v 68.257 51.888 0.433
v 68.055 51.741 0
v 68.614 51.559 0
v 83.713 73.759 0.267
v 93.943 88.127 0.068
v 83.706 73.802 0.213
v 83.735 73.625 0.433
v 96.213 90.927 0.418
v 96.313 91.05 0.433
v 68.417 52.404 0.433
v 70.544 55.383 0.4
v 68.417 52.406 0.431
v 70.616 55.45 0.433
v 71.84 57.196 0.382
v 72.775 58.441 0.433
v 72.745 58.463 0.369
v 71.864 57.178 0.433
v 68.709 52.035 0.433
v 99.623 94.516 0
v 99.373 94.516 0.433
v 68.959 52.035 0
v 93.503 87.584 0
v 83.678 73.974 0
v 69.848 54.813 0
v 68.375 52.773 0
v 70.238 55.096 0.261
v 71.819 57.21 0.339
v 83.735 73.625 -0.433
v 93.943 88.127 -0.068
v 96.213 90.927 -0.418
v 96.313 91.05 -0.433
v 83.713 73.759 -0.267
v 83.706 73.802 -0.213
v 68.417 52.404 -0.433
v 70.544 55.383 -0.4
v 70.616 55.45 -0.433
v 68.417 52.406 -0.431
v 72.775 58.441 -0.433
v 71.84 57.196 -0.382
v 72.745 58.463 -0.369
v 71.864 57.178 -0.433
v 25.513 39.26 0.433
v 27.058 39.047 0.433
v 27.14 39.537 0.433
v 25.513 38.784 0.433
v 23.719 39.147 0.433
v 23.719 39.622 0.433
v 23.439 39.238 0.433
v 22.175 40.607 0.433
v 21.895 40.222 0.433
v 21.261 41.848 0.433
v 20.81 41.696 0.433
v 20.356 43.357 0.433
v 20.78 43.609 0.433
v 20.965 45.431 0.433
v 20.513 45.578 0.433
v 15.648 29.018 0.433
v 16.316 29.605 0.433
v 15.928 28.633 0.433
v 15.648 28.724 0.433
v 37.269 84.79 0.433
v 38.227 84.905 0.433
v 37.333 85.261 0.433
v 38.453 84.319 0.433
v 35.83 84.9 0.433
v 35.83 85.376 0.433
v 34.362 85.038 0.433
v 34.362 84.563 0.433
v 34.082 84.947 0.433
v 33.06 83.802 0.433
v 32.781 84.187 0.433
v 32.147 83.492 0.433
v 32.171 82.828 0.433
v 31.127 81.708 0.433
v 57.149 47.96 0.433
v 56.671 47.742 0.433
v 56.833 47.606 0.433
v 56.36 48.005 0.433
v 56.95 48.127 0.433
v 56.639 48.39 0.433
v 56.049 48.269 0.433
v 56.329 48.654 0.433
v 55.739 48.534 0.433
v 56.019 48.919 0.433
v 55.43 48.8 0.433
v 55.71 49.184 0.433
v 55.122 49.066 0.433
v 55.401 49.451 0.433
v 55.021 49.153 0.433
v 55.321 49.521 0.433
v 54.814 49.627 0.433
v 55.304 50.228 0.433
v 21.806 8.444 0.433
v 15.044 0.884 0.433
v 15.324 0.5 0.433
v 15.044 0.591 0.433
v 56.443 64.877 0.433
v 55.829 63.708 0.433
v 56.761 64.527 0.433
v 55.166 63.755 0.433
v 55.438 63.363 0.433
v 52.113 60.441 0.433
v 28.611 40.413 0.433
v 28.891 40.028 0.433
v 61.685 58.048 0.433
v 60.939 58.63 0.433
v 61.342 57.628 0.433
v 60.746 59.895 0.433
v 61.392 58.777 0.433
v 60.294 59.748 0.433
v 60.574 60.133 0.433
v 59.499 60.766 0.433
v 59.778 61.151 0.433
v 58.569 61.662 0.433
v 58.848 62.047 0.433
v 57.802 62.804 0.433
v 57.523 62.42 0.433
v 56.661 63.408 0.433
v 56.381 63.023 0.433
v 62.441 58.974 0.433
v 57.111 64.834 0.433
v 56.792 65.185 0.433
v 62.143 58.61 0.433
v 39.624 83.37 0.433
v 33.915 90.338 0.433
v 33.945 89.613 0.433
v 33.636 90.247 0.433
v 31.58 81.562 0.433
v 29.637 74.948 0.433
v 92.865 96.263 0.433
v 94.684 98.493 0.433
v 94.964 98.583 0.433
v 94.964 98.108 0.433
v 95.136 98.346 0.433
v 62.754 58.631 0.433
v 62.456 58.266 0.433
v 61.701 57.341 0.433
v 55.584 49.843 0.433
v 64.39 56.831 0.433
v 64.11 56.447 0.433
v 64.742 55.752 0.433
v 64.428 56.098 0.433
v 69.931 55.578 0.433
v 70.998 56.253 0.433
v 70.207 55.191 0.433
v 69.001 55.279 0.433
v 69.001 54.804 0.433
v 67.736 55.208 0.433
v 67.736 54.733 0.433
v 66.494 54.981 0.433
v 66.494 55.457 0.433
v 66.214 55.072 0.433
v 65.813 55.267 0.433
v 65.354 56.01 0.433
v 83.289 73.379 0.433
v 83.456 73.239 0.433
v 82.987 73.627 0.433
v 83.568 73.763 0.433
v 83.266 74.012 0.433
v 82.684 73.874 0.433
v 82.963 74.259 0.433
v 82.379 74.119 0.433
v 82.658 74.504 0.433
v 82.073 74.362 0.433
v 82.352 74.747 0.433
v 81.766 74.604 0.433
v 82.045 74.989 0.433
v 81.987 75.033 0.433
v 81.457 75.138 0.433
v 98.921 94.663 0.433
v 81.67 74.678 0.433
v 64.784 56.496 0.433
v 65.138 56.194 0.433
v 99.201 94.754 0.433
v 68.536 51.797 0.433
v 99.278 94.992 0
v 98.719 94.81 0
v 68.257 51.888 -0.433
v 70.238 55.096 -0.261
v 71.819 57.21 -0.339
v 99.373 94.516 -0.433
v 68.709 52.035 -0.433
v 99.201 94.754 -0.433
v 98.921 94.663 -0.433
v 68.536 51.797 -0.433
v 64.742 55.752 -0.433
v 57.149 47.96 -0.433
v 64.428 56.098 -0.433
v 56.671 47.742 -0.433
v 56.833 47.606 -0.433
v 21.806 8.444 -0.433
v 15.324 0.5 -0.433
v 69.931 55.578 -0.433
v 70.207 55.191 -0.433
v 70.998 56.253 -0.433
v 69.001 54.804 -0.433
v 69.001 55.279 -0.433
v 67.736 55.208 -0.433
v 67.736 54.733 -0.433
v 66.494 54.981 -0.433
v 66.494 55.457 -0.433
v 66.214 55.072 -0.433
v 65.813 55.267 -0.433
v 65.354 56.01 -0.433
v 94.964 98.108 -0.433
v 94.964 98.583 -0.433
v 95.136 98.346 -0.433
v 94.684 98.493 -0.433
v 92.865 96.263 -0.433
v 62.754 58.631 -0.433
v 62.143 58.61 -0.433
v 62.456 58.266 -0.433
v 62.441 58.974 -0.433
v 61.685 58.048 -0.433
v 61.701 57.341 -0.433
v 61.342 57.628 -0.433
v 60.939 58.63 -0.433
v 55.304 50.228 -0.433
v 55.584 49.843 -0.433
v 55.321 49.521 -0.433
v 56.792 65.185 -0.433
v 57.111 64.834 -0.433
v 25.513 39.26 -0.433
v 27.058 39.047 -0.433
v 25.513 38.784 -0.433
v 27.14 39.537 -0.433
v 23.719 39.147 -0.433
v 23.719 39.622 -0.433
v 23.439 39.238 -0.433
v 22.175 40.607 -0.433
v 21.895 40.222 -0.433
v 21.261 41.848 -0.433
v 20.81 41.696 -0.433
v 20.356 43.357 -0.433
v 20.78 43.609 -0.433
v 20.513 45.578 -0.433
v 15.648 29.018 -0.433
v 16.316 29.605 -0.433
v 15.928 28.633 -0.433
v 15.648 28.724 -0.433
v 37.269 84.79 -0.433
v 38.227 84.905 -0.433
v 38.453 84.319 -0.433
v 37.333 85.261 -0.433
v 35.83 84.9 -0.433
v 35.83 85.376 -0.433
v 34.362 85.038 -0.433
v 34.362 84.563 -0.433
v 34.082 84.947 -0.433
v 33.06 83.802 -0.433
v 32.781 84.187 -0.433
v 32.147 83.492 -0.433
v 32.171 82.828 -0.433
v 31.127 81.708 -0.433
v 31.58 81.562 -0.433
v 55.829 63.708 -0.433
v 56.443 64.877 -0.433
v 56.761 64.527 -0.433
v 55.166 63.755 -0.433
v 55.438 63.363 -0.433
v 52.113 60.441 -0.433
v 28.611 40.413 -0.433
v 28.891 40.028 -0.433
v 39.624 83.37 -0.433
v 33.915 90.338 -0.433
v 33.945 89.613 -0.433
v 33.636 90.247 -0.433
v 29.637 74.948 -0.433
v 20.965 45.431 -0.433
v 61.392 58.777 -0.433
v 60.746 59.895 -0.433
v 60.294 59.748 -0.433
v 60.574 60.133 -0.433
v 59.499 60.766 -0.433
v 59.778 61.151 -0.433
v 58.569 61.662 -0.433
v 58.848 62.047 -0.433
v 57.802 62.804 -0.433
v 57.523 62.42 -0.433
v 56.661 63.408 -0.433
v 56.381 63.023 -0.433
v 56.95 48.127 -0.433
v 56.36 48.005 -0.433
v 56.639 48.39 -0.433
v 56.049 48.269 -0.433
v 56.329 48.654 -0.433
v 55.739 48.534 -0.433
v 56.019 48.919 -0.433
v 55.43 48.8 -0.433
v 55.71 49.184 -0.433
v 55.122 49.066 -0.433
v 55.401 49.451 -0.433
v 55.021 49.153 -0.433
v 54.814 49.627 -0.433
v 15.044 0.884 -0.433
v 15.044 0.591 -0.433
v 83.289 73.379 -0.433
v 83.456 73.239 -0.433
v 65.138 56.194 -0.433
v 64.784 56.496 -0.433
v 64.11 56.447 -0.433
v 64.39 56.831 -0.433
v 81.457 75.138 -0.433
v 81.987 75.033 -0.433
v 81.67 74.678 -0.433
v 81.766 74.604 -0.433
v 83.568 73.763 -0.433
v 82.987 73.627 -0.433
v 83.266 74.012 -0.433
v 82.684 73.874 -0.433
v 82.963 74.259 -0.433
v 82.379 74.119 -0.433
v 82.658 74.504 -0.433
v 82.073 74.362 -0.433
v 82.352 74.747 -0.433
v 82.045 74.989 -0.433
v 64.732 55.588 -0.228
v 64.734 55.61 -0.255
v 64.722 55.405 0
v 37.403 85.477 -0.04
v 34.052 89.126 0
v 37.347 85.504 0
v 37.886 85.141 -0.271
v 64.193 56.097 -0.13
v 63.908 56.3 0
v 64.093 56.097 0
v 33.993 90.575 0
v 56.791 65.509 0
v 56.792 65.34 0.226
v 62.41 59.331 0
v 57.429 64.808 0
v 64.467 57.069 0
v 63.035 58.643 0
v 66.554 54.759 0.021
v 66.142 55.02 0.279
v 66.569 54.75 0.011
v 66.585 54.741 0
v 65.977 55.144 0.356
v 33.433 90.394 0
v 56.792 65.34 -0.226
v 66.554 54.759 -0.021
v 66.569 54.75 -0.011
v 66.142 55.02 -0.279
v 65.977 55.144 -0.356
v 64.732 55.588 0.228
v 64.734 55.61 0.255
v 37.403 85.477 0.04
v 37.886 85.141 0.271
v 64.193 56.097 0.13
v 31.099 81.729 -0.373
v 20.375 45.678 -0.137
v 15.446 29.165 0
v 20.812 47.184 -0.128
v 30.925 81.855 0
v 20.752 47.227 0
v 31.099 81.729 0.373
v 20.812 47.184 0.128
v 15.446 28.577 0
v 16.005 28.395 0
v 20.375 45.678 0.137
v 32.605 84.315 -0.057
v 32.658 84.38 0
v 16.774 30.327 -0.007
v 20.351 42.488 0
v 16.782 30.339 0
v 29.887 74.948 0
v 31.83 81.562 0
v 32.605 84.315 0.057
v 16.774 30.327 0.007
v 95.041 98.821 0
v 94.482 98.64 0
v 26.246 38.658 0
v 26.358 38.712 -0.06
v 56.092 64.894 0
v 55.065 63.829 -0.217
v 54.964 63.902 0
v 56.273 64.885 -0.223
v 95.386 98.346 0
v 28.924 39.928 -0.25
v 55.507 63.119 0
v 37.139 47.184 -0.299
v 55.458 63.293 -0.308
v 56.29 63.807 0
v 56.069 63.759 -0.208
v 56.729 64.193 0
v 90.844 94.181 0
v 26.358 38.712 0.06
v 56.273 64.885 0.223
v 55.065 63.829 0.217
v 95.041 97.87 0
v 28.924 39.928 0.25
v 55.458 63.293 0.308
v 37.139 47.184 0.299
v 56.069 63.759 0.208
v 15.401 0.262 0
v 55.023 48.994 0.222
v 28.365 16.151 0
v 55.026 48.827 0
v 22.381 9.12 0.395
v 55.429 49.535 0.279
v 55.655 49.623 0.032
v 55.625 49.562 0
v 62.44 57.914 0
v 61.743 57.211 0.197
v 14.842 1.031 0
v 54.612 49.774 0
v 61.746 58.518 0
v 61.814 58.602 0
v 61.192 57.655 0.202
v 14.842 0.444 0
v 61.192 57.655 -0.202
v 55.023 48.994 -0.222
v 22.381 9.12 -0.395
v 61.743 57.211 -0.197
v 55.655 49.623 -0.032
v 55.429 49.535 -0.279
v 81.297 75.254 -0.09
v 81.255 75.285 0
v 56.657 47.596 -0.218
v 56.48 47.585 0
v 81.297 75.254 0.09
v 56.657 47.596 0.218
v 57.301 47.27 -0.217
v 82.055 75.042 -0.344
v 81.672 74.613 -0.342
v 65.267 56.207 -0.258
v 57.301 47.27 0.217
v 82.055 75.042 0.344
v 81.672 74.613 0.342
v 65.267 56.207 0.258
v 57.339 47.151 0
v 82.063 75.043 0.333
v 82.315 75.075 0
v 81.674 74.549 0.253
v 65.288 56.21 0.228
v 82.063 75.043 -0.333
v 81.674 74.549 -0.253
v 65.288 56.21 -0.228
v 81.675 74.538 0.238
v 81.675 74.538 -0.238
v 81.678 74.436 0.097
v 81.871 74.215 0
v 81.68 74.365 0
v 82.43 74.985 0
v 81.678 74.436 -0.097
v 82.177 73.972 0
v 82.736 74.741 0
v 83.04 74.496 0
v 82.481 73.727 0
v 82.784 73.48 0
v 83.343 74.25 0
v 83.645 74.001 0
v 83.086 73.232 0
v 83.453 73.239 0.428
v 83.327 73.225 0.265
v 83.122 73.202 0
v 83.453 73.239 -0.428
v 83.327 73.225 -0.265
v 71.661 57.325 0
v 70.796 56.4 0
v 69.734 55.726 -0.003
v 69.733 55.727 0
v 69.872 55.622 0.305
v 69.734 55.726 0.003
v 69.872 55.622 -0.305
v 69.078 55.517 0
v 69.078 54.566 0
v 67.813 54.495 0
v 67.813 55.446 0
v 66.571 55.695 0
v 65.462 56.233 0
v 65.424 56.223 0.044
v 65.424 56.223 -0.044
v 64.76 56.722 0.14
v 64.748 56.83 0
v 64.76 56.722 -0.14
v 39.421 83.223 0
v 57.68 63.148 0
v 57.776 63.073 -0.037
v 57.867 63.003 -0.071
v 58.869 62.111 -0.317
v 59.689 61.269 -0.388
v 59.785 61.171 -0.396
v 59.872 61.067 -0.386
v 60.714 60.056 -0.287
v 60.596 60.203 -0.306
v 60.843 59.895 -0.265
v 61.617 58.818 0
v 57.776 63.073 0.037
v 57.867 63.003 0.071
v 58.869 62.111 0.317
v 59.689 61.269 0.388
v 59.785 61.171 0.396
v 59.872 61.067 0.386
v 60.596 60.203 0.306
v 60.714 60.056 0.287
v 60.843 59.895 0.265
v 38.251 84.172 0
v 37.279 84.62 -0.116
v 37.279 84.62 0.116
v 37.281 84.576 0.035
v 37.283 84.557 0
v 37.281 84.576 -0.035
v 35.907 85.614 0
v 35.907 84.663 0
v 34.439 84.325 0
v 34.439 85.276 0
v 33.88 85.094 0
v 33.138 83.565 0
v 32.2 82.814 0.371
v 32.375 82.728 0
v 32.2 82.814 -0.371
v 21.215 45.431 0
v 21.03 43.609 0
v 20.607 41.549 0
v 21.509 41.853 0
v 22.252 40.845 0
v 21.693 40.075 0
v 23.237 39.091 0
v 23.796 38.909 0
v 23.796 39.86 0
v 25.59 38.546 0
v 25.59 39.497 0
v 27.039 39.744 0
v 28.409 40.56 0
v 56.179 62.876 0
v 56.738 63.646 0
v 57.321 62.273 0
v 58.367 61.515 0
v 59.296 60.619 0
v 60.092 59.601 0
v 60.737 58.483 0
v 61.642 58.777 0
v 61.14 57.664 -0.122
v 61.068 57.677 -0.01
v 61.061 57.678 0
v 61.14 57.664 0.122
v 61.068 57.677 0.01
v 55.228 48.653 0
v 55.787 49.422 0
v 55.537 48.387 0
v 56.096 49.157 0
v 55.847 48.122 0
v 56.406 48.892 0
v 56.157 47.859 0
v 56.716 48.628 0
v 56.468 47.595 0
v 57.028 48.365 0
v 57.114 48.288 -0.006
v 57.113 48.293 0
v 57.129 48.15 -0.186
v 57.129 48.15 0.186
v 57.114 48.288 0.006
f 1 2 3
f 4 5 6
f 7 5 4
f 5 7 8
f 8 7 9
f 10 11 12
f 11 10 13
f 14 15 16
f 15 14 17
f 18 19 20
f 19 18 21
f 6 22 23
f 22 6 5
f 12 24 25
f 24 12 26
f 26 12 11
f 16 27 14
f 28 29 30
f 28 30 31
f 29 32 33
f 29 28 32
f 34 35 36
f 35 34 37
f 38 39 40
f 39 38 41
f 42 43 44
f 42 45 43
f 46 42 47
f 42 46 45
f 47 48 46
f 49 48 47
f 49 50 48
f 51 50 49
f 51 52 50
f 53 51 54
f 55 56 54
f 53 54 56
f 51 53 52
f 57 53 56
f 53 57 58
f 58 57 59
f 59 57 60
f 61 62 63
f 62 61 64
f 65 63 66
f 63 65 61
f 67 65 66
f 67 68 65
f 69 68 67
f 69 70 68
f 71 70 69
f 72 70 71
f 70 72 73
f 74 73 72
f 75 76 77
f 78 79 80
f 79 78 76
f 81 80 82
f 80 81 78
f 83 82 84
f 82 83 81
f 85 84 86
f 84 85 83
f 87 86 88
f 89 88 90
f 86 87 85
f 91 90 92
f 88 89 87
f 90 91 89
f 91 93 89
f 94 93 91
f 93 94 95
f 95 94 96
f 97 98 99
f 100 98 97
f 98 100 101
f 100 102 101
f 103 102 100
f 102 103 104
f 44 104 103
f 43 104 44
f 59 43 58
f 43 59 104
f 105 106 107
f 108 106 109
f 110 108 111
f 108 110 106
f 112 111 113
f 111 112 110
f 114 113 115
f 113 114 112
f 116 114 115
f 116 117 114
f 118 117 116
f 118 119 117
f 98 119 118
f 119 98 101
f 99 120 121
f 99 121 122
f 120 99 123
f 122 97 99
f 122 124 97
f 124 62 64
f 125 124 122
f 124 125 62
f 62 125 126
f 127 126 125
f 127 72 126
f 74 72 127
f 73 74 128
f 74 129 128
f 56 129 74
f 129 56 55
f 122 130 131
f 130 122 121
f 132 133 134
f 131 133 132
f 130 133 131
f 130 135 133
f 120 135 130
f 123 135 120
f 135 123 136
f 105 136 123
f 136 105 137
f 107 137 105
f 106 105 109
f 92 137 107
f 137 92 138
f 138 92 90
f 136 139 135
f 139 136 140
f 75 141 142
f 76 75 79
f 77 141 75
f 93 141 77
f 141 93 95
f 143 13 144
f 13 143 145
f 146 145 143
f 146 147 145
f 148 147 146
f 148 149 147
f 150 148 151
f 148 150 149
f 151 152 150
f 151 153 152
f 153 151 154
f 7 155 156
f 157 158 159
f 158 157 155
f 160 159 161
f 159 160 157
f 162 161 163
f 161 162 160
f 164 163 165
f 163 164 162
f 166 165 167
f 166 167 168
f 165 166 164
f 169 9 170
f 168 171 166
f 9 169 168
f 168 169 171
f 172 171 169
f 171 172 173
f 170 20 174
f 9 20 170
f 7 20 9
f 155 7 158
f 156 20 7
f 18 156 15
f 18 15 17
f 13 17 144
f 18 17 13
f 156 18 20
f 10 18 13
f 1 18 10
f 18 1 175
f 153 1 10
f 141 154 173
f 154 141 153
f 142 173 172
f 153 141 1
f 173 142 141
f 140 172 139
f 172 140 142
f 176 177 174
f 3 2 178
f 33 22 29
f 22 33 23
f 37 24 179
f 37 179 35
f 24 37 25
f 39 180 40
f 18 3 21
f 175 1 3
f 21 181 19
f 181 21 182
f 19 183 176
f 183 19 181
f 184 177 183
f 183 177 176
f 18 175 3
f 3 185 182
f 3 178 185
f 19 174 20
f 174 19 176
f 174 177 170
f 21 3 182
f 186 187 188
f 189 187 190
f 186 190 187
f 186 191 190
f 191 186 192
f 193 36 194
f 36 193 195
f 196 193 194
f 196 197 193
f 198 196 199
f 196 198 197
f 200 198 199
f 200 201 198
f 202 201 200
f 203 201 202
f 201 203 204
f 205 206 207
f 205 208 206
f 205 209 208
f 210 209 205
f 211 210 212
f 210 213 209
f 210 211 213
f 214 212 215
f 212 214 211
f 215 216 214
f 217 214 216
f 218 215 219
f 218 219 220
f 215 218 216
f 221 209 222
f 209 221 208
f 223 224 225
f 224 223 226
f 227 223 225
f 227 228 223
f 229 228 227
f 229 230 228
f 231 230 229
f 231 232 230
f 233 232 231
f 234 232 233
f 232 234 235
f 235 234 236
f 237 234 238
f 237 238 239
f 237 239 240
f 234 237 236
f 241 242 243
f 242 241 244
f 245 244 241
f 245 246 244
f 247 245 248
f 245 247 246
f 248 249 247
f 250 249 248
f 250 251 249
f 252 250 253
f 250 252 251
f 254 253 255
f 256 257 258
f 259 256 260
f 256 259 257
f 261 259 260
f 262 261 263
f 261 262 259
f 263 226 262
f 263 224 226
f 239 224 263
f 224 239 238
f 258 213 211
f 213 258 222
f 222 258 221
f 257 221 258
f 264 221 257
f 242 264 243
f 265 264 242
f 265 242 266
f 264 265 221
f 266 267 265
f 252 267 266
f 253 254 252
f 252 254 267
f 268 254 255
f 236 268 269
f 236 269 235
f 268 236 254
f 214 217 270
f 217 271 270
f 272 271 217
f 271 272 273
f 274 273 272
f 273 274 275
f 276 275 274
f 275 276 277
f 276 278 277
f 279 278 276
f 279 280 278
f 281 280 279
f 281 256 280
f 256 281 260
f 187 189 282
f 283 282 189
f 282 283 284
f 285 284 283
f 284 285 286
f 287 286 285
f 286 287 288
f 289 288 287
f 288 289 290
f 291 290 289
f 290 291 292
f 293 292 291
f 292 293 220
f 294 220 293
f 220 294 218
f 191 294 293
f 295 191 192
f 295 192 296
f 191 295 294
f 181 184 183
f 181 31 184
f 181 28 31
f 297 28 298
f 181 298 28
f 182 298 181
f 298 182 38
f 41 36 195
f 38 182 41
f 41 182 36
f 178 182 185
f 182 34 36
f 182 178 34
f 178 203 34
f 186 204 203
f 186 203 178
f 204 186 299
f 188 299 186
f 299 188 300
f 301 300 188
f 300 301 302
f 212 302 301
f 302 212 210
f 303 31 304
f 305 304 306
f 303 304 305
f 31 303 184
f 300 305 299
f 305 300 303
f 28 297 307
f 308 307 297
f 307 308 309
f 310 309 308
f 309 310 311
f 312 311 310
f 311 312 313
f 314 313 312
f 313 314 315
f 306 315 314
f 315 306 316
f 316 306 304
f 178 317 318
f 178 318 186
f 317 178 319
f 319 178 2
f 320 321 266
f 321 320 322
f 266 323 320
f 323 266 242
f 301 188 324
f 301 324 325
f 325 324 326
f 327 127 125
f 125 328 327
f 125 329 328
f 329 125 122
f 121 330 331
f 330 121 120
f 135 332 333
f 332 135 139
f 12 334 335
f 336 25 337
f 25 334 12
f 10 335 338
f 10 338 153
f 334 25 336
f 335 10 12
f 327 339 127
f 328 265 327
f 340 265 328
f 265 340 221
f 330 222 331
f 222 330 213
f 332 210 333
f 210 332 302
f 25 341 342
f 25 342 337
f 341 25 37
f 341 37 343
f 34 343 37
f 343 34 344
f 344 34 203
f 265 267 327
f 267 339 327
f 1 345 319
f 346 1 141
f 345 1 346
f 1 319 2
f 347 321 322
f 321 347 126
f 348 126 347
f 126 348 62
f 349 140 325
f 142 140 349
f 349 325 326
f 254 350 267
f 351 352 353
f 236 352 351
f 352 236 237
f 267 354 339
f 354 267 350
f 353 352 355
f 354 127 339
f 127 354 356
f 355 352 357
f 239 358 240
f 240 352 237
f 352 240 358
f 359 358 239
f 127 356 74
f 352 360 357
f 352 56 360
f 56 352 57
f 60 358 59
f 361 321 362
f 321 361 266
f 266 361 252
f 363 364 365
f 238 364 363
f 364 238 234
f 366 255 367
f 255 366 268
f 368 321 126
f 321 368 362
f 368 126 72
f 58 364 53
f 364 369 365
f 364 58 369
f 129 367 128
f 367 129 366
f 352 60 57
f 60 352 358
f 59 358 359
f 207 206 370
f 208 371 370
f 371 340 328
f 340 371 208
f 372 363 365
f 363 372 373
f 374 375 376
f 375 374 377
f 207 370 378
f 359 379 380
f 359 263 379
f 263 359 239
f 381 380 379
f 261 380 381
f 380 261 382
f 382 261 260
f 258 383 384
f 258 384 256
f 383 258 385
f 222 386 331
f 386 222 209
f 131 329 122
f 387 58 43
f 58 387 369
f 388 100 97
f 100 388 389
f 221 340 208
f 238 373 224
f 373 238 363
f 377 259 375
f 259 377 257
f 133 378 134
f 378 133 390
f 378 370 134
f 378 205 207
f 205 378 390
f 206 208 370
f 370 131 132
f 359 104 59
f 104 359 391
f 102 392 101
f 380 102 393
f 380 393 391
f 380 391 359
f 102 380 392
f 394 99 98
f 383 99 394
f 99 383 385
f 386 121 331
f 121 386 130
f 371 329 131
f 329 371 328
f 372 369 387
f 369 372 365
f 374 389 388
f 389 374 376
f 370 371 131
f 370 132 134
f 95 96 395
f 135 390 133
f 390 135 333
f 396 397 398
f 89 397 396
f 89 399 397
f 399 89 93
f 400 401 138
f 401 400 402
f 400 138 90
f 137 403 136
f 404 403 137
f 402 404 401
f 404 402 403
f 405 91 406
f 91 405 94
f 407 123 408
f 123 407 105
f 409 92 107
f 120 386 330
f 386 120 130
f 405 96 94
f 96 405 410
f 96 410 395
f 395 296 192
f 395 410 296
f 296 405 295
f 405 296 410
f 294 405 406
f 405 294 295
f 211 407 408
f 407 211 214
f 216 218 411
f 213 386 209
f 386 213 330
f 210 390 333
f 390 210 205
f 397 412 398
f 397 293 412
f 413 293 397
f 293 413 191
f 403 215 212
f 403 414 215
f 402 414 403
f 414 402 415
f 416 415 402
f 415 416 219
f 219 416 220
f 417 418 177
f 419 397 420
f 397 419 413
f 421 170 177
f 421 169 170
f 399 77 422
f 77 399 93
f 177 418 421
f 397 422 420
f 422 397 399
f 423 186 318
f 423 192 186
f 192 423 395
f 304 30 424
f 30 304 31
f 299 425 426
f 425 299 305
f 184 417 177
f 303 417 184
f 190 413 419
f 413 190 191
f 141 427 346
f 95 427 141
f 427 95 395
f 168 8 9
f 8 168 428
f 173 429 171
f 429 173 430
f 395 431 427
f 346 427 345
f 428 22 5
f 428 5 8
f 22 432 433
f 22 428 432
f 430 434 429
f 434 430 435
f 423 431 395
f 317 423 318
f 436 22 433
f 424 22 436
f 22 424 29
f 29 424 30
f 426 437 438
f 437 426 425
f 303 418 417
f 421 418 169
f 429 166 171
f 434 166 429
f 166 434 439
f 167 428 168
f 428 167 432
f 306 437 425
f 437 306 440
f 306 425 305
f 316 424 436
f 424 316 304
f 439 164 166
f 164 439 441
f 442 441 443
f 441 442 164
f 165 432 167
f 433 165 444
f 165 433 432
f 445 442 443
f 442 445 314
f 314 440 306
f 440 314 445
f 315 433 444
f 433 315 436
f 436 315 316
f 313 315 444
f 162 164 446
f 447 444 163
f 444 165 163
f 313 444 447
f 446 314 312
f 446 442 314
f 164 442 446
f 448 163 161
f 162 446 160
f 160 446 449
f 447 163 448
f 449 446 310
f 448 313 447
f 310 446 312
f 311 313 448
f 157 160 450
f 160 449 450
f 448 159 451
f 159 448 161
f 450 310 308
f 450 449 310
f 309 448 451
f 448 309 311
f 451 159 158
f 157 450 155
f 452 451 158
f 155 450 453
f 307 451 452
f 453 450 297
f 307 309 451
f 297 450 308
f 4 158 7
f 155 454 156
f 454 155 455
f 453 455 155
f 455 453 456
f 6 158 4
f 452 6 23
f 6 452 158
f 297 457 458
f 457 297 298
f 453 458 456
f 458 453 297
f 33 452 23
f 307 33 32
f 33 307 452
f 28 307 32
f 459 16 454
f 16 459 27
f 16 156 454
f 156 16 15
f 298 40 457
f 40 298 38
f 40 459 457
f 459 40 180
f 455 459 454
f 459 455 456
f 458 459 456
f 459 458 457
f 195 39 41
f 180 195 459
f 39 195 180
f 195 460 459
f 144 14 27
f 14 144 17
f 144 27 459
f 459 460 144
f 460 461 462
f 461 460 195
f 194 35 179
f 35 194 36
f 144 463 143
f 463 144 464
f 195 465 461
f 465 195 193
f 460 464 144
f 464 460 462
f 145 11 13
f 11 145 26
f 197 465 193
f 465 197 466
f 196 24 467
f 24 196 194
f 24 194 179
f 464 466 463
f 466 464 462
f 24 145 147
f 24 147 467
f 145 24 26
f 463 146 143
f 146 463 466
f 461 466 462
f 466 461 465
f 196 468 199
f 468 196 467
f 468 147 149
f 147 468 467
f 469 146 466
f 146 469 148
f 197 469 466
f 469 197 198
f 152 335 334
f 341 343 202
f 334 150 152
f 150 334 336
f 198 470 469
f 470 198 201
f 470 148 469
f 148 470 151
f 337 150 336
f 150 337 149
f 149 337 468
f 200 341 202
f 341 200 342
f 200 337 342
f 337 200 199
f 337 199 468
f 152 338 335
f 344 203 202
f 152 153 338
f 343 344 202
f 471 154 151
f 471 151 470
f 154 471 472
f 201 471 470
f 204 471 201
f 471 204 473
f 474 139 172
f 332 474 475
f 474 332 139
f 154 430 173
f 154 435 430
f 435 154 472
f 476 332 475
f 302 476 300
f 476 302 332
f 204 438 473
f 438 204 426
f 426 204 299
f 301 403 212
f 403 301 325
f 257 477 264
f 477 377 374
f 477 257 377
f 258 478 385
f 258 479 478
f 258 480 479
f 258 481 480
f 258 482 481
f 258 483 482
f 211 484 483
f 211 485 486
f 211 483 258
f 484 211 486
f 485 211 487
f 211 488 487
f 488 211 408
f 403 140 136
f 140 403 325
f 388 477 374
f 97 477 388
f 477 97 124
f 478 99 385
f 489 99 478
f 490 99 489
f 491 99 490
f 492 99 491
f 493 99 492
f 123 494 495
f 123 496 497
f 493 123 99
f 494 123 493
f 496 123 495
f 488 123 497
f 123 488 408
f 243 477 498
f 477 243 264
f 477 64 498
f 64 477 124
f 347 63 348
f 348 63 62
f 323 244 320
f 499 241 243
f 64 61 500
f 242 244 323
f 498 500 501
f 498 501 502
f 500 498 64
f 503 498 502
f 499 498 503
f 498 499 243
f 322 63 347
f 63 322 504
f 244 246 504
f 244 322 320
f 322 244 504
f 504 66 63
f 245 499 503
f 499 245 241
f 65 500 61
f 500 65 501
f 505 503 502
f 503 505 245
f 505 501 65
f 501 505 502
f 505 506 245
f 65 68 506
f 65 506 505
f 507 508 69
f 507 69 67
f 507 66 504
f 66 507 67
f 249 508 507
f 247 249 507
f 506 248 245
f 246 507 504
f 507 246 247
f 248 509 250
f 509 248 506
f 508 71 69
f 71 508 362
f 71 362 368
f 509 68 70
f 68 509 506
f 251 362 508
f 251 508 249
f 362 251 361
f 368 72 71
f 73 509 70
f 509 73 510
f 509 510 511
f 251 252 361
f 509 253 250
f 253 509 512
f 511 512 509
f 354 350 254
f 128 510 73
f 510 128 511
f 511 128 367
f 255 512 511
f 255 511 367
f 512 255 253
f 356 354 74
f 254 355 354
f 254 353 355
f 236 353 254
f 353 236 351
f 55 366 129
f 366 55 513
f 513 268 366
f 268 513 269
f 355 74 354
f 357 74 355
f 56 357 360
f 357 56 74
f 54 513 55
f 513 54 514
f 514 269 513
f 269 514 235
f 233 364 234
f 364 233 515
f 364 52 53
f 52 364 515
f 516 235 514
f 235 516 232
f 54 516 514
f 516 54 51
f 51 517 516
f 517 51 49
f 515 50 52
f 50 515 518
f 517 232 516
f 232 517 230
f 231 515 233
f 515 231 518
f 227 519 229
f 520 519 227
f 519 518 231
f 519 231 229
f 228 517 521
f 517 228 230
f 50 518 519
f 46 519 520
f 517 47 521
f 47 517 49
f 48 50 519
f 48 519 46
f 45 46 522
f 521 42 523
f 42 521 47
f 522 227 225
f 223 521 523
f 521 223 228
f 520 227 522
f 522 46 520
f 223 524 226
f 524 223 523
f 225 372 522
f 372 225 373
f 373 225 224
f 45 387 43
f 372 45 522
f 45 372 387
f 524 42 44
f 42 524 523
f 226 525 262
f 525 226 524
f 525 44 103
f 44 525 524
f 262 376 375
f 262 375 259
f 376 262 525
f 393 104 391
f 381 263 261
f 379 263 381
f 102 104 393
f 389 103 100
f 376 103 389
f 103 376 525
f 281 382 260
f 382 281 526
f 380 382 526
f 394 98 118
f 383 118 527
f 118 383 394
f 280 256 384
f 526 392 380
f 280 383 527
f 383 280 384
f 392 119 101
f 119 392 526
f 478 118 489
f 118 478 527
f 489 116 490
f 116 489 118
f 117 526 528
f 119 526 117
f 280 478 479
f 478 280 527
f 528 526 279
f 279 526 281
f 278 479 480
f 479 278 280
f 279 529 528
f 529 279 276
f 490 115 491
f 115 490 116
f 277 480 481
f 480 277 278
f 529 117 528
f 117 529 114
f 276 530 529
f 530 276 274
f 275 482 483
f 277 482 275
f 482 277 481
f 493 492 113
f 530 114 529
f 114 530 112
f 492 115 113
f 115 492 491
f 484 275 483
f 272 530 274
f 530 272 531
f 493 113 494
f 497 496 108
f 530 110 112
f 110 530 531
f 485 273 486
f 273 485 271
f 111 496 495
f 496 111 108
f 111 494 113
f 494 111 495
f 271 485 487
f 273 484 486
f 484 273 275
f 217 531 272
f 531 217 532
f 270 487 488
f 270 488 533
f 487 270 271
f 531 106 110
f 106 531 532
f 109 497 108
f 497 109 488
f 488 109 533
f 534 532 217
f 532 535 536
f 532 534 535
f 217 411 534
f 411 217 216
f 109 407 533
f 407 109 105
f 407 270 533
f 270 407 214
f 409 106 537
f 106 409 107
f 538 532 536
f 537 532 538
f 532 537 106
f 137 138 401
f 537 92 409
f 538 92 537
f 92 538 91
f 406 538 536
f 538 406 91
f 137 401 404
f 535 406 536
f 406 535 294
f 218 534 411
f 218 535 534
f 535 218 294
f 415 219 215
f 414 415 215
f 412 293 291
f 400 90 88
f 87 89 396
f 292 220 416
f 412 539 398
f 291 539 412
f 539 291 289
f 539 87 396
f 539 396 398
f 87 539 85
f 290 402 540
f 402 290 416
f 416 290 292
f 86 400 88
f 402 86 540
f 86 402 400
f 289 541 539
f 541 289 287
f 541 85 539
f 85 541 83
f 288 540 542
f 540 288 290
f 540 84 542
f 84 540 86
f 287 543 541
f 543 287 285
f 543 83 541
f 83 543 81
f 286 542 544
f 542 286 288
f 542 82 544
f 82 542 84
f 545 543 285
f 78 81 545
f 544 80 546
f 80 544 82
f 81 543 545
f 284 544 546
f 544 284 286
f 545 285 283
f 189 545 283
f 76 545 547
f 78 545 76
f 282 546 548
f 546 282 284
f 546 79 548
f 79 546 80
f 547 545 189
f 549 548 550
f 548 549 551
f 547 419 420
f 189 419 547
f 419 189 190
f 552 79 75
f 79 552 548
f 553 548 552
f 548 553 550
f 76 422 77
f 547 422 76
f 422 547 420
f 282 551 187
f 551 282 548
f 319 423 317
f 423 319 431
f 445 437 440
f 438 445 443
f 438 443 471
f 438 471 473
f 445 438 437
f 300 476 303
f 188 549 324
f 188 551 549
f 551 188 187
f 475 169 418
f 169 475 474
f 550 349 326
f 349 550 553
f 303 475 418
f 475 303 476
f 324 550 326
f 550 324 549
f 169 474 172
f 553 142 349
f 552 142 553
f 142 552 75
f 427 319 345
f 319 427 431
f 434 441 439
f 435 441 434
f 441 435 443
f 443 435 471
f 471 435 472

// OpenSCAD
// Library: round-anything
// Version: 1.0
// Author: IrevDev
// Copyright: 2017
// License: GPL 3

// Changes
// test module with random points
// reworte most of polyRound . heavily use of wrap function
// move Collinear check to top of round3points, 
// single point (p2) return of round3points in case of mostly collinear 
// less may cause problems with many succesive collinear points
// constrained tangD to the shortest leg p1-p2, or p2-p3
 test();
//callExamples();
 module test()
{
p=[for(i=[0:5])[rnd(0,100),rnd(0,100),rnd(0,100),5]];
 p=[for(i=[0:5])[rnd(0,100),rnd(0,100) ,5]];

//echo(p);
R =a3DpolyRound(p,7);
R = polyRound(p,7);
//polygon(R ); 
 color("red")translate([0,0,0])polyline(getpoints(p),0.2);
  translate([0,0,0])polyline( (R));

 
}
//a3Dround3points([rnd(0,15),rnd(0,15),rnd(0,15)],[rnd(0,15),rnd(0,15),rnd(0,15)],[rnd(0,15),rnd(0,15),rnd(0,15)],rnd(1,5),8);

 


function polyRound(radiipoints,fn=5)=
// reworte most of it all here heavily use of wrap function

 let(p=getpoints(radiipoints)) 
 let(r=getradii(radiipoints))

let(Lp1=last(p),Lp=Lp1+1)
let(temp=[for(i=[0:last(p)]) 
 
round3points(
p[wrap(i-1,Lp,0)],
p[wrap(i  ,Lp,0)],
p[wrap(i+1,Lp,0)],
r[wrap(i,Lp,0)],
fn)

]
 
) 

//common trick  to flatten a list of list
    [for (a = temp)
        for (b = a) b];

function a3DpolyRound(radiipoints,fn=5)=
// reworte most of it all here heavily use of wrap function

 let(p=get3points(radiipoints)) 
 let(r=get3radii(radiipoints))

let(Lp1=last(p),Lp=Lp1+1)
let(
temp=[for(i=[0:last(p)]) 
a3Dround3points(
p[wrap(i-1,Lp,0)],
p[wrap(i  ,Lp,0)],
p[wrap(i+1,Lp,0)],
r[wrap(i,Lp,0)],
fn)])
//common trick  to flatten a list of list
    [for (a = temp)
        for (b = a) b];


function angle (a,b)= (atan2(norm(cross(a,b)),a*b));
function a3Dround3points(p1,p2,p3,r,fn)=
 
let(
p12=p1-p2,
p32=p3-p2,
m12=norm(p12),
m32=norm(p32),
angle123=  (   angle( (p12), (p32))),

a=[m12,0],
b=[0,0],
c=[sin(angle123)*m32,cos(angle123)*m32],


temp= round3points(a,b,c,r,fn)
,e=echo(a,c,angle123,r)
 )
[
for (l = temp)
 p2  
 + (l.x *  c.y + l.y * -c.x )*(1/(a.x*c.y-c.x*a.y)) * (p12) 
 + (l.x * -a.y + l.y *  a.x )*(1/(a.x*c.y-c.x*a.y)) * (p32) 
 
 

 
]

;
function rot(p,a)=[
p.x*cos(a)-p.y*sin(a),
p.x*sin(a)+p.y*cos(a),0];

function round3points(p1,p2,p3,r,fn)=
// move check to top, single point reurn in case of collinear
      dot(un(p1-p2),(p2-p3))>0.98||r==0?[ p2 ]
    : 
    let(ang= (cosineRuleAngle(p1,p2,p3)) )//angle between the lines
// constrained tangD to the shortest leg p1-p2, or p2-p3
    let(tangD=min(norm(p1-p2)/2 ,norm(p2-p3)/2, r/tan(ang/2)))//distance to the tangent point from p2
    let(circD=r/sin(ang/2))//distance to the circle centre from p2
    let(a12=abs(atan(getGradient(p1,p2))))//angle of line 1
    let(a23=abs(atan(getGradient(p2,p3))))//angle of line 2
    
    let(vec21=p1-p2)//vector from p2 to p1
    let(vec23=p3-p2)//vector from p2 to p3
    let(dir21x=vec21[0]==0?0:vec21[0]/abs(vec21[0]))//tangent along line p2 to p1 x polerisation. Returns 1,-1 or 0
    let(dir21y=vec21[1]==0?0:vec21[1]/abs(vec21[1]))//tangent along line p2 to p1 y polerisation. Returns 1,-1 or 0
    let(dir23x=vec23[0]==0?0:vec23[0]/abs(vec23[0]))//tangent along line p3 to p1 x polerisation. Returns 1,-1 or 0
    let(dir23y=vec23[1]==0?0:vec23[1]/abs(vec23[1]))//tangent along line p3 to p1 Y polerisation. Returns 1,-1 or 0
    
    let(t12=[p2[0]+dir21x*cos(a12)*tangD,p2[1]+dir21y*sin(a12)*tangD])//tangent point along line p2 to p2 by offseting from p2
    let(t23=[p2[0]+dir23x*cos(a23)*tangD,p2[1]+dir23y*sin(a23)*tangD])//tangent point along line p2 to p3 by offseting from p2
    
    let(vec_=getMidpoint(t12,t23)-p2)//vector from P1 to the midpoint of the two tangents
    let(dirx_=vec_[0]==0?0:vec_[0]/abs(vec_[0]))//circle center point x polerisation
    let(diry_=vec_[1]==0?0:vec_[1]/abs(vec_[1]))//circle center point y polerisation
    let(a_=abs(atan(getGradient(getMidpoint(t12,t23),p2))))//angle of line from tangent midpoints to p2
    let(cen=[p2[0]+dirx_*cos(a_)*circD,p2[1]+diry_*sin(a_)*circD])//circle center by offseting from p2
    
    let(e1=(p2[0]-p1[0])*(p2[1]+p1[1]))//edge 1
    let(e2=(p3[0]-p2[0])*(p3[1]+p2[1]))//edge 2
    let(e3=(p1[0]-p3[0])*(p1[1]+p3[1]))//edge 3
    let(CWorCCW=(e1+e2+e3)/abs(e1+e2+e3))//rotation of the three points cw or ccw?
   CentreN2PointsArc(t12,t23,cen,CWorCCW,fn);

        
function CentreN2PointsArc(p1,p2,cen,CWorCCW,fn)=
    let(r=pointDist(p1,cen))
    let(CircA1=invtan(p1[0]-cen[0],p1[1]-cen[1]))//angle of line 1
    let(CircA2=cosineRuleAngle(p2,cen,p1))//angle between the lines
    [for(i=[0:fn]) [cos(CircA1+(CircA2/fn)*-i*CWorCCW)*r+cen[0],sin(CircA1+(CircA2/fn)*-i*CWorCCW)*r+cen[1]]];
 
function invtan(run,rise)=
    let(a=abs(atan(rise/run)))
    rise==0&&run>0?0:rise>0&&run>0?a:rise>0&&run==0?90:rise>0&&run<0?180-a:rise==0&&run<0?180:rise<0&&run<0?a+180:rise<0&&run==0?270:rise<0&&run>0?360-a:"error";

function cosineRuleAngle(p1,p2,p3)=
    let(p12=abs(pointDist(p1,p2)))
    let(p13=abs(pointDist(p1,p3)))
    let(p23=abs(pointDist(p2,p3)))
    acos((sq(p23)+sq(p12)-sq(p13))/(2*p23*p12));
    
function getIntersect(m1,m2,k1,k2)=
    let(x=(k2-k1)/(m1-m2))
    let(y=m1*x+k1)
    [x,y];

function sq(x)=x*x;
function getGradient(p1,p2)=(p2[1]-p1[1])/(p2[0]-p1[0]);
function getConstant(p,m)=p[1]-m*p[0];
function getMidpoint(p1,p2)=[(p1[0]+p2[0])/2,(p1[1]+p2[1])/2];
function pointDist(p1,p2)=sqrt(abs(sq(p1[0]-p2[0])+sq(p1[1]-p2[1])));



 module polyline(p) {for(i=[0:max(0,len(p)-1)]) color(rands(0,1,3) )line(p[i],p[wrap(i+1,len(p) )]);
} // polyline plotter

module line(p1, p2 ,width=0.5) 
{ // single line plotter
    hull() {
        translate(p1) sphere(width);
        translate(p2) sphere(width);
    }
}
function zipxyr(a,b)=[for(i=[0:last(a)])[a[i].x,a[i].y,b[i]]];

function getpoints(p)=[for(i=[0:len(p)-1])[p[i].x,p[i].y ]];// gets [x,y]list of[x,y,r]list
function getradii(p)= [for(i=[0:len(p)-1])p[i][2]]; // gets [r]list of[x,y,r]list
function get3points(p)=[for(i=[0:len(p)-1])[p[i].x,p[i].y,p[i].z]];// gets [x,y,z]list of[x,y,z,r]list
function get3radii(p)= [for(i=[0:len(p)-1])p[i][3]]; // gets [r]list of[x,y,r]list

function wrap(x,x_max=1,x_min=0) = (((x - x_min) % (x_max - x_min)) + (x_max - x_min)) % (x_max - x_min) + x_min; // wraps numbers inside boundaries
function dot (a,b)=a*b; // dotproduct is implied in * of vextoes
function last(i)=len(i)-1;// shorthand sugar for len(i)-1
function un(v)=v/max(norm(v),1e-16);// div by zero safe unit normal
function rnd(a = 1, b = 0, s = []) = 
  s == [] ? 
   (rands(min(a, b), max(   a, b), 1)[0]) 
  : 
   (rands(min(a, b), max(a, b), 1, s)[0])
  ; // nice rands wrapper
 
